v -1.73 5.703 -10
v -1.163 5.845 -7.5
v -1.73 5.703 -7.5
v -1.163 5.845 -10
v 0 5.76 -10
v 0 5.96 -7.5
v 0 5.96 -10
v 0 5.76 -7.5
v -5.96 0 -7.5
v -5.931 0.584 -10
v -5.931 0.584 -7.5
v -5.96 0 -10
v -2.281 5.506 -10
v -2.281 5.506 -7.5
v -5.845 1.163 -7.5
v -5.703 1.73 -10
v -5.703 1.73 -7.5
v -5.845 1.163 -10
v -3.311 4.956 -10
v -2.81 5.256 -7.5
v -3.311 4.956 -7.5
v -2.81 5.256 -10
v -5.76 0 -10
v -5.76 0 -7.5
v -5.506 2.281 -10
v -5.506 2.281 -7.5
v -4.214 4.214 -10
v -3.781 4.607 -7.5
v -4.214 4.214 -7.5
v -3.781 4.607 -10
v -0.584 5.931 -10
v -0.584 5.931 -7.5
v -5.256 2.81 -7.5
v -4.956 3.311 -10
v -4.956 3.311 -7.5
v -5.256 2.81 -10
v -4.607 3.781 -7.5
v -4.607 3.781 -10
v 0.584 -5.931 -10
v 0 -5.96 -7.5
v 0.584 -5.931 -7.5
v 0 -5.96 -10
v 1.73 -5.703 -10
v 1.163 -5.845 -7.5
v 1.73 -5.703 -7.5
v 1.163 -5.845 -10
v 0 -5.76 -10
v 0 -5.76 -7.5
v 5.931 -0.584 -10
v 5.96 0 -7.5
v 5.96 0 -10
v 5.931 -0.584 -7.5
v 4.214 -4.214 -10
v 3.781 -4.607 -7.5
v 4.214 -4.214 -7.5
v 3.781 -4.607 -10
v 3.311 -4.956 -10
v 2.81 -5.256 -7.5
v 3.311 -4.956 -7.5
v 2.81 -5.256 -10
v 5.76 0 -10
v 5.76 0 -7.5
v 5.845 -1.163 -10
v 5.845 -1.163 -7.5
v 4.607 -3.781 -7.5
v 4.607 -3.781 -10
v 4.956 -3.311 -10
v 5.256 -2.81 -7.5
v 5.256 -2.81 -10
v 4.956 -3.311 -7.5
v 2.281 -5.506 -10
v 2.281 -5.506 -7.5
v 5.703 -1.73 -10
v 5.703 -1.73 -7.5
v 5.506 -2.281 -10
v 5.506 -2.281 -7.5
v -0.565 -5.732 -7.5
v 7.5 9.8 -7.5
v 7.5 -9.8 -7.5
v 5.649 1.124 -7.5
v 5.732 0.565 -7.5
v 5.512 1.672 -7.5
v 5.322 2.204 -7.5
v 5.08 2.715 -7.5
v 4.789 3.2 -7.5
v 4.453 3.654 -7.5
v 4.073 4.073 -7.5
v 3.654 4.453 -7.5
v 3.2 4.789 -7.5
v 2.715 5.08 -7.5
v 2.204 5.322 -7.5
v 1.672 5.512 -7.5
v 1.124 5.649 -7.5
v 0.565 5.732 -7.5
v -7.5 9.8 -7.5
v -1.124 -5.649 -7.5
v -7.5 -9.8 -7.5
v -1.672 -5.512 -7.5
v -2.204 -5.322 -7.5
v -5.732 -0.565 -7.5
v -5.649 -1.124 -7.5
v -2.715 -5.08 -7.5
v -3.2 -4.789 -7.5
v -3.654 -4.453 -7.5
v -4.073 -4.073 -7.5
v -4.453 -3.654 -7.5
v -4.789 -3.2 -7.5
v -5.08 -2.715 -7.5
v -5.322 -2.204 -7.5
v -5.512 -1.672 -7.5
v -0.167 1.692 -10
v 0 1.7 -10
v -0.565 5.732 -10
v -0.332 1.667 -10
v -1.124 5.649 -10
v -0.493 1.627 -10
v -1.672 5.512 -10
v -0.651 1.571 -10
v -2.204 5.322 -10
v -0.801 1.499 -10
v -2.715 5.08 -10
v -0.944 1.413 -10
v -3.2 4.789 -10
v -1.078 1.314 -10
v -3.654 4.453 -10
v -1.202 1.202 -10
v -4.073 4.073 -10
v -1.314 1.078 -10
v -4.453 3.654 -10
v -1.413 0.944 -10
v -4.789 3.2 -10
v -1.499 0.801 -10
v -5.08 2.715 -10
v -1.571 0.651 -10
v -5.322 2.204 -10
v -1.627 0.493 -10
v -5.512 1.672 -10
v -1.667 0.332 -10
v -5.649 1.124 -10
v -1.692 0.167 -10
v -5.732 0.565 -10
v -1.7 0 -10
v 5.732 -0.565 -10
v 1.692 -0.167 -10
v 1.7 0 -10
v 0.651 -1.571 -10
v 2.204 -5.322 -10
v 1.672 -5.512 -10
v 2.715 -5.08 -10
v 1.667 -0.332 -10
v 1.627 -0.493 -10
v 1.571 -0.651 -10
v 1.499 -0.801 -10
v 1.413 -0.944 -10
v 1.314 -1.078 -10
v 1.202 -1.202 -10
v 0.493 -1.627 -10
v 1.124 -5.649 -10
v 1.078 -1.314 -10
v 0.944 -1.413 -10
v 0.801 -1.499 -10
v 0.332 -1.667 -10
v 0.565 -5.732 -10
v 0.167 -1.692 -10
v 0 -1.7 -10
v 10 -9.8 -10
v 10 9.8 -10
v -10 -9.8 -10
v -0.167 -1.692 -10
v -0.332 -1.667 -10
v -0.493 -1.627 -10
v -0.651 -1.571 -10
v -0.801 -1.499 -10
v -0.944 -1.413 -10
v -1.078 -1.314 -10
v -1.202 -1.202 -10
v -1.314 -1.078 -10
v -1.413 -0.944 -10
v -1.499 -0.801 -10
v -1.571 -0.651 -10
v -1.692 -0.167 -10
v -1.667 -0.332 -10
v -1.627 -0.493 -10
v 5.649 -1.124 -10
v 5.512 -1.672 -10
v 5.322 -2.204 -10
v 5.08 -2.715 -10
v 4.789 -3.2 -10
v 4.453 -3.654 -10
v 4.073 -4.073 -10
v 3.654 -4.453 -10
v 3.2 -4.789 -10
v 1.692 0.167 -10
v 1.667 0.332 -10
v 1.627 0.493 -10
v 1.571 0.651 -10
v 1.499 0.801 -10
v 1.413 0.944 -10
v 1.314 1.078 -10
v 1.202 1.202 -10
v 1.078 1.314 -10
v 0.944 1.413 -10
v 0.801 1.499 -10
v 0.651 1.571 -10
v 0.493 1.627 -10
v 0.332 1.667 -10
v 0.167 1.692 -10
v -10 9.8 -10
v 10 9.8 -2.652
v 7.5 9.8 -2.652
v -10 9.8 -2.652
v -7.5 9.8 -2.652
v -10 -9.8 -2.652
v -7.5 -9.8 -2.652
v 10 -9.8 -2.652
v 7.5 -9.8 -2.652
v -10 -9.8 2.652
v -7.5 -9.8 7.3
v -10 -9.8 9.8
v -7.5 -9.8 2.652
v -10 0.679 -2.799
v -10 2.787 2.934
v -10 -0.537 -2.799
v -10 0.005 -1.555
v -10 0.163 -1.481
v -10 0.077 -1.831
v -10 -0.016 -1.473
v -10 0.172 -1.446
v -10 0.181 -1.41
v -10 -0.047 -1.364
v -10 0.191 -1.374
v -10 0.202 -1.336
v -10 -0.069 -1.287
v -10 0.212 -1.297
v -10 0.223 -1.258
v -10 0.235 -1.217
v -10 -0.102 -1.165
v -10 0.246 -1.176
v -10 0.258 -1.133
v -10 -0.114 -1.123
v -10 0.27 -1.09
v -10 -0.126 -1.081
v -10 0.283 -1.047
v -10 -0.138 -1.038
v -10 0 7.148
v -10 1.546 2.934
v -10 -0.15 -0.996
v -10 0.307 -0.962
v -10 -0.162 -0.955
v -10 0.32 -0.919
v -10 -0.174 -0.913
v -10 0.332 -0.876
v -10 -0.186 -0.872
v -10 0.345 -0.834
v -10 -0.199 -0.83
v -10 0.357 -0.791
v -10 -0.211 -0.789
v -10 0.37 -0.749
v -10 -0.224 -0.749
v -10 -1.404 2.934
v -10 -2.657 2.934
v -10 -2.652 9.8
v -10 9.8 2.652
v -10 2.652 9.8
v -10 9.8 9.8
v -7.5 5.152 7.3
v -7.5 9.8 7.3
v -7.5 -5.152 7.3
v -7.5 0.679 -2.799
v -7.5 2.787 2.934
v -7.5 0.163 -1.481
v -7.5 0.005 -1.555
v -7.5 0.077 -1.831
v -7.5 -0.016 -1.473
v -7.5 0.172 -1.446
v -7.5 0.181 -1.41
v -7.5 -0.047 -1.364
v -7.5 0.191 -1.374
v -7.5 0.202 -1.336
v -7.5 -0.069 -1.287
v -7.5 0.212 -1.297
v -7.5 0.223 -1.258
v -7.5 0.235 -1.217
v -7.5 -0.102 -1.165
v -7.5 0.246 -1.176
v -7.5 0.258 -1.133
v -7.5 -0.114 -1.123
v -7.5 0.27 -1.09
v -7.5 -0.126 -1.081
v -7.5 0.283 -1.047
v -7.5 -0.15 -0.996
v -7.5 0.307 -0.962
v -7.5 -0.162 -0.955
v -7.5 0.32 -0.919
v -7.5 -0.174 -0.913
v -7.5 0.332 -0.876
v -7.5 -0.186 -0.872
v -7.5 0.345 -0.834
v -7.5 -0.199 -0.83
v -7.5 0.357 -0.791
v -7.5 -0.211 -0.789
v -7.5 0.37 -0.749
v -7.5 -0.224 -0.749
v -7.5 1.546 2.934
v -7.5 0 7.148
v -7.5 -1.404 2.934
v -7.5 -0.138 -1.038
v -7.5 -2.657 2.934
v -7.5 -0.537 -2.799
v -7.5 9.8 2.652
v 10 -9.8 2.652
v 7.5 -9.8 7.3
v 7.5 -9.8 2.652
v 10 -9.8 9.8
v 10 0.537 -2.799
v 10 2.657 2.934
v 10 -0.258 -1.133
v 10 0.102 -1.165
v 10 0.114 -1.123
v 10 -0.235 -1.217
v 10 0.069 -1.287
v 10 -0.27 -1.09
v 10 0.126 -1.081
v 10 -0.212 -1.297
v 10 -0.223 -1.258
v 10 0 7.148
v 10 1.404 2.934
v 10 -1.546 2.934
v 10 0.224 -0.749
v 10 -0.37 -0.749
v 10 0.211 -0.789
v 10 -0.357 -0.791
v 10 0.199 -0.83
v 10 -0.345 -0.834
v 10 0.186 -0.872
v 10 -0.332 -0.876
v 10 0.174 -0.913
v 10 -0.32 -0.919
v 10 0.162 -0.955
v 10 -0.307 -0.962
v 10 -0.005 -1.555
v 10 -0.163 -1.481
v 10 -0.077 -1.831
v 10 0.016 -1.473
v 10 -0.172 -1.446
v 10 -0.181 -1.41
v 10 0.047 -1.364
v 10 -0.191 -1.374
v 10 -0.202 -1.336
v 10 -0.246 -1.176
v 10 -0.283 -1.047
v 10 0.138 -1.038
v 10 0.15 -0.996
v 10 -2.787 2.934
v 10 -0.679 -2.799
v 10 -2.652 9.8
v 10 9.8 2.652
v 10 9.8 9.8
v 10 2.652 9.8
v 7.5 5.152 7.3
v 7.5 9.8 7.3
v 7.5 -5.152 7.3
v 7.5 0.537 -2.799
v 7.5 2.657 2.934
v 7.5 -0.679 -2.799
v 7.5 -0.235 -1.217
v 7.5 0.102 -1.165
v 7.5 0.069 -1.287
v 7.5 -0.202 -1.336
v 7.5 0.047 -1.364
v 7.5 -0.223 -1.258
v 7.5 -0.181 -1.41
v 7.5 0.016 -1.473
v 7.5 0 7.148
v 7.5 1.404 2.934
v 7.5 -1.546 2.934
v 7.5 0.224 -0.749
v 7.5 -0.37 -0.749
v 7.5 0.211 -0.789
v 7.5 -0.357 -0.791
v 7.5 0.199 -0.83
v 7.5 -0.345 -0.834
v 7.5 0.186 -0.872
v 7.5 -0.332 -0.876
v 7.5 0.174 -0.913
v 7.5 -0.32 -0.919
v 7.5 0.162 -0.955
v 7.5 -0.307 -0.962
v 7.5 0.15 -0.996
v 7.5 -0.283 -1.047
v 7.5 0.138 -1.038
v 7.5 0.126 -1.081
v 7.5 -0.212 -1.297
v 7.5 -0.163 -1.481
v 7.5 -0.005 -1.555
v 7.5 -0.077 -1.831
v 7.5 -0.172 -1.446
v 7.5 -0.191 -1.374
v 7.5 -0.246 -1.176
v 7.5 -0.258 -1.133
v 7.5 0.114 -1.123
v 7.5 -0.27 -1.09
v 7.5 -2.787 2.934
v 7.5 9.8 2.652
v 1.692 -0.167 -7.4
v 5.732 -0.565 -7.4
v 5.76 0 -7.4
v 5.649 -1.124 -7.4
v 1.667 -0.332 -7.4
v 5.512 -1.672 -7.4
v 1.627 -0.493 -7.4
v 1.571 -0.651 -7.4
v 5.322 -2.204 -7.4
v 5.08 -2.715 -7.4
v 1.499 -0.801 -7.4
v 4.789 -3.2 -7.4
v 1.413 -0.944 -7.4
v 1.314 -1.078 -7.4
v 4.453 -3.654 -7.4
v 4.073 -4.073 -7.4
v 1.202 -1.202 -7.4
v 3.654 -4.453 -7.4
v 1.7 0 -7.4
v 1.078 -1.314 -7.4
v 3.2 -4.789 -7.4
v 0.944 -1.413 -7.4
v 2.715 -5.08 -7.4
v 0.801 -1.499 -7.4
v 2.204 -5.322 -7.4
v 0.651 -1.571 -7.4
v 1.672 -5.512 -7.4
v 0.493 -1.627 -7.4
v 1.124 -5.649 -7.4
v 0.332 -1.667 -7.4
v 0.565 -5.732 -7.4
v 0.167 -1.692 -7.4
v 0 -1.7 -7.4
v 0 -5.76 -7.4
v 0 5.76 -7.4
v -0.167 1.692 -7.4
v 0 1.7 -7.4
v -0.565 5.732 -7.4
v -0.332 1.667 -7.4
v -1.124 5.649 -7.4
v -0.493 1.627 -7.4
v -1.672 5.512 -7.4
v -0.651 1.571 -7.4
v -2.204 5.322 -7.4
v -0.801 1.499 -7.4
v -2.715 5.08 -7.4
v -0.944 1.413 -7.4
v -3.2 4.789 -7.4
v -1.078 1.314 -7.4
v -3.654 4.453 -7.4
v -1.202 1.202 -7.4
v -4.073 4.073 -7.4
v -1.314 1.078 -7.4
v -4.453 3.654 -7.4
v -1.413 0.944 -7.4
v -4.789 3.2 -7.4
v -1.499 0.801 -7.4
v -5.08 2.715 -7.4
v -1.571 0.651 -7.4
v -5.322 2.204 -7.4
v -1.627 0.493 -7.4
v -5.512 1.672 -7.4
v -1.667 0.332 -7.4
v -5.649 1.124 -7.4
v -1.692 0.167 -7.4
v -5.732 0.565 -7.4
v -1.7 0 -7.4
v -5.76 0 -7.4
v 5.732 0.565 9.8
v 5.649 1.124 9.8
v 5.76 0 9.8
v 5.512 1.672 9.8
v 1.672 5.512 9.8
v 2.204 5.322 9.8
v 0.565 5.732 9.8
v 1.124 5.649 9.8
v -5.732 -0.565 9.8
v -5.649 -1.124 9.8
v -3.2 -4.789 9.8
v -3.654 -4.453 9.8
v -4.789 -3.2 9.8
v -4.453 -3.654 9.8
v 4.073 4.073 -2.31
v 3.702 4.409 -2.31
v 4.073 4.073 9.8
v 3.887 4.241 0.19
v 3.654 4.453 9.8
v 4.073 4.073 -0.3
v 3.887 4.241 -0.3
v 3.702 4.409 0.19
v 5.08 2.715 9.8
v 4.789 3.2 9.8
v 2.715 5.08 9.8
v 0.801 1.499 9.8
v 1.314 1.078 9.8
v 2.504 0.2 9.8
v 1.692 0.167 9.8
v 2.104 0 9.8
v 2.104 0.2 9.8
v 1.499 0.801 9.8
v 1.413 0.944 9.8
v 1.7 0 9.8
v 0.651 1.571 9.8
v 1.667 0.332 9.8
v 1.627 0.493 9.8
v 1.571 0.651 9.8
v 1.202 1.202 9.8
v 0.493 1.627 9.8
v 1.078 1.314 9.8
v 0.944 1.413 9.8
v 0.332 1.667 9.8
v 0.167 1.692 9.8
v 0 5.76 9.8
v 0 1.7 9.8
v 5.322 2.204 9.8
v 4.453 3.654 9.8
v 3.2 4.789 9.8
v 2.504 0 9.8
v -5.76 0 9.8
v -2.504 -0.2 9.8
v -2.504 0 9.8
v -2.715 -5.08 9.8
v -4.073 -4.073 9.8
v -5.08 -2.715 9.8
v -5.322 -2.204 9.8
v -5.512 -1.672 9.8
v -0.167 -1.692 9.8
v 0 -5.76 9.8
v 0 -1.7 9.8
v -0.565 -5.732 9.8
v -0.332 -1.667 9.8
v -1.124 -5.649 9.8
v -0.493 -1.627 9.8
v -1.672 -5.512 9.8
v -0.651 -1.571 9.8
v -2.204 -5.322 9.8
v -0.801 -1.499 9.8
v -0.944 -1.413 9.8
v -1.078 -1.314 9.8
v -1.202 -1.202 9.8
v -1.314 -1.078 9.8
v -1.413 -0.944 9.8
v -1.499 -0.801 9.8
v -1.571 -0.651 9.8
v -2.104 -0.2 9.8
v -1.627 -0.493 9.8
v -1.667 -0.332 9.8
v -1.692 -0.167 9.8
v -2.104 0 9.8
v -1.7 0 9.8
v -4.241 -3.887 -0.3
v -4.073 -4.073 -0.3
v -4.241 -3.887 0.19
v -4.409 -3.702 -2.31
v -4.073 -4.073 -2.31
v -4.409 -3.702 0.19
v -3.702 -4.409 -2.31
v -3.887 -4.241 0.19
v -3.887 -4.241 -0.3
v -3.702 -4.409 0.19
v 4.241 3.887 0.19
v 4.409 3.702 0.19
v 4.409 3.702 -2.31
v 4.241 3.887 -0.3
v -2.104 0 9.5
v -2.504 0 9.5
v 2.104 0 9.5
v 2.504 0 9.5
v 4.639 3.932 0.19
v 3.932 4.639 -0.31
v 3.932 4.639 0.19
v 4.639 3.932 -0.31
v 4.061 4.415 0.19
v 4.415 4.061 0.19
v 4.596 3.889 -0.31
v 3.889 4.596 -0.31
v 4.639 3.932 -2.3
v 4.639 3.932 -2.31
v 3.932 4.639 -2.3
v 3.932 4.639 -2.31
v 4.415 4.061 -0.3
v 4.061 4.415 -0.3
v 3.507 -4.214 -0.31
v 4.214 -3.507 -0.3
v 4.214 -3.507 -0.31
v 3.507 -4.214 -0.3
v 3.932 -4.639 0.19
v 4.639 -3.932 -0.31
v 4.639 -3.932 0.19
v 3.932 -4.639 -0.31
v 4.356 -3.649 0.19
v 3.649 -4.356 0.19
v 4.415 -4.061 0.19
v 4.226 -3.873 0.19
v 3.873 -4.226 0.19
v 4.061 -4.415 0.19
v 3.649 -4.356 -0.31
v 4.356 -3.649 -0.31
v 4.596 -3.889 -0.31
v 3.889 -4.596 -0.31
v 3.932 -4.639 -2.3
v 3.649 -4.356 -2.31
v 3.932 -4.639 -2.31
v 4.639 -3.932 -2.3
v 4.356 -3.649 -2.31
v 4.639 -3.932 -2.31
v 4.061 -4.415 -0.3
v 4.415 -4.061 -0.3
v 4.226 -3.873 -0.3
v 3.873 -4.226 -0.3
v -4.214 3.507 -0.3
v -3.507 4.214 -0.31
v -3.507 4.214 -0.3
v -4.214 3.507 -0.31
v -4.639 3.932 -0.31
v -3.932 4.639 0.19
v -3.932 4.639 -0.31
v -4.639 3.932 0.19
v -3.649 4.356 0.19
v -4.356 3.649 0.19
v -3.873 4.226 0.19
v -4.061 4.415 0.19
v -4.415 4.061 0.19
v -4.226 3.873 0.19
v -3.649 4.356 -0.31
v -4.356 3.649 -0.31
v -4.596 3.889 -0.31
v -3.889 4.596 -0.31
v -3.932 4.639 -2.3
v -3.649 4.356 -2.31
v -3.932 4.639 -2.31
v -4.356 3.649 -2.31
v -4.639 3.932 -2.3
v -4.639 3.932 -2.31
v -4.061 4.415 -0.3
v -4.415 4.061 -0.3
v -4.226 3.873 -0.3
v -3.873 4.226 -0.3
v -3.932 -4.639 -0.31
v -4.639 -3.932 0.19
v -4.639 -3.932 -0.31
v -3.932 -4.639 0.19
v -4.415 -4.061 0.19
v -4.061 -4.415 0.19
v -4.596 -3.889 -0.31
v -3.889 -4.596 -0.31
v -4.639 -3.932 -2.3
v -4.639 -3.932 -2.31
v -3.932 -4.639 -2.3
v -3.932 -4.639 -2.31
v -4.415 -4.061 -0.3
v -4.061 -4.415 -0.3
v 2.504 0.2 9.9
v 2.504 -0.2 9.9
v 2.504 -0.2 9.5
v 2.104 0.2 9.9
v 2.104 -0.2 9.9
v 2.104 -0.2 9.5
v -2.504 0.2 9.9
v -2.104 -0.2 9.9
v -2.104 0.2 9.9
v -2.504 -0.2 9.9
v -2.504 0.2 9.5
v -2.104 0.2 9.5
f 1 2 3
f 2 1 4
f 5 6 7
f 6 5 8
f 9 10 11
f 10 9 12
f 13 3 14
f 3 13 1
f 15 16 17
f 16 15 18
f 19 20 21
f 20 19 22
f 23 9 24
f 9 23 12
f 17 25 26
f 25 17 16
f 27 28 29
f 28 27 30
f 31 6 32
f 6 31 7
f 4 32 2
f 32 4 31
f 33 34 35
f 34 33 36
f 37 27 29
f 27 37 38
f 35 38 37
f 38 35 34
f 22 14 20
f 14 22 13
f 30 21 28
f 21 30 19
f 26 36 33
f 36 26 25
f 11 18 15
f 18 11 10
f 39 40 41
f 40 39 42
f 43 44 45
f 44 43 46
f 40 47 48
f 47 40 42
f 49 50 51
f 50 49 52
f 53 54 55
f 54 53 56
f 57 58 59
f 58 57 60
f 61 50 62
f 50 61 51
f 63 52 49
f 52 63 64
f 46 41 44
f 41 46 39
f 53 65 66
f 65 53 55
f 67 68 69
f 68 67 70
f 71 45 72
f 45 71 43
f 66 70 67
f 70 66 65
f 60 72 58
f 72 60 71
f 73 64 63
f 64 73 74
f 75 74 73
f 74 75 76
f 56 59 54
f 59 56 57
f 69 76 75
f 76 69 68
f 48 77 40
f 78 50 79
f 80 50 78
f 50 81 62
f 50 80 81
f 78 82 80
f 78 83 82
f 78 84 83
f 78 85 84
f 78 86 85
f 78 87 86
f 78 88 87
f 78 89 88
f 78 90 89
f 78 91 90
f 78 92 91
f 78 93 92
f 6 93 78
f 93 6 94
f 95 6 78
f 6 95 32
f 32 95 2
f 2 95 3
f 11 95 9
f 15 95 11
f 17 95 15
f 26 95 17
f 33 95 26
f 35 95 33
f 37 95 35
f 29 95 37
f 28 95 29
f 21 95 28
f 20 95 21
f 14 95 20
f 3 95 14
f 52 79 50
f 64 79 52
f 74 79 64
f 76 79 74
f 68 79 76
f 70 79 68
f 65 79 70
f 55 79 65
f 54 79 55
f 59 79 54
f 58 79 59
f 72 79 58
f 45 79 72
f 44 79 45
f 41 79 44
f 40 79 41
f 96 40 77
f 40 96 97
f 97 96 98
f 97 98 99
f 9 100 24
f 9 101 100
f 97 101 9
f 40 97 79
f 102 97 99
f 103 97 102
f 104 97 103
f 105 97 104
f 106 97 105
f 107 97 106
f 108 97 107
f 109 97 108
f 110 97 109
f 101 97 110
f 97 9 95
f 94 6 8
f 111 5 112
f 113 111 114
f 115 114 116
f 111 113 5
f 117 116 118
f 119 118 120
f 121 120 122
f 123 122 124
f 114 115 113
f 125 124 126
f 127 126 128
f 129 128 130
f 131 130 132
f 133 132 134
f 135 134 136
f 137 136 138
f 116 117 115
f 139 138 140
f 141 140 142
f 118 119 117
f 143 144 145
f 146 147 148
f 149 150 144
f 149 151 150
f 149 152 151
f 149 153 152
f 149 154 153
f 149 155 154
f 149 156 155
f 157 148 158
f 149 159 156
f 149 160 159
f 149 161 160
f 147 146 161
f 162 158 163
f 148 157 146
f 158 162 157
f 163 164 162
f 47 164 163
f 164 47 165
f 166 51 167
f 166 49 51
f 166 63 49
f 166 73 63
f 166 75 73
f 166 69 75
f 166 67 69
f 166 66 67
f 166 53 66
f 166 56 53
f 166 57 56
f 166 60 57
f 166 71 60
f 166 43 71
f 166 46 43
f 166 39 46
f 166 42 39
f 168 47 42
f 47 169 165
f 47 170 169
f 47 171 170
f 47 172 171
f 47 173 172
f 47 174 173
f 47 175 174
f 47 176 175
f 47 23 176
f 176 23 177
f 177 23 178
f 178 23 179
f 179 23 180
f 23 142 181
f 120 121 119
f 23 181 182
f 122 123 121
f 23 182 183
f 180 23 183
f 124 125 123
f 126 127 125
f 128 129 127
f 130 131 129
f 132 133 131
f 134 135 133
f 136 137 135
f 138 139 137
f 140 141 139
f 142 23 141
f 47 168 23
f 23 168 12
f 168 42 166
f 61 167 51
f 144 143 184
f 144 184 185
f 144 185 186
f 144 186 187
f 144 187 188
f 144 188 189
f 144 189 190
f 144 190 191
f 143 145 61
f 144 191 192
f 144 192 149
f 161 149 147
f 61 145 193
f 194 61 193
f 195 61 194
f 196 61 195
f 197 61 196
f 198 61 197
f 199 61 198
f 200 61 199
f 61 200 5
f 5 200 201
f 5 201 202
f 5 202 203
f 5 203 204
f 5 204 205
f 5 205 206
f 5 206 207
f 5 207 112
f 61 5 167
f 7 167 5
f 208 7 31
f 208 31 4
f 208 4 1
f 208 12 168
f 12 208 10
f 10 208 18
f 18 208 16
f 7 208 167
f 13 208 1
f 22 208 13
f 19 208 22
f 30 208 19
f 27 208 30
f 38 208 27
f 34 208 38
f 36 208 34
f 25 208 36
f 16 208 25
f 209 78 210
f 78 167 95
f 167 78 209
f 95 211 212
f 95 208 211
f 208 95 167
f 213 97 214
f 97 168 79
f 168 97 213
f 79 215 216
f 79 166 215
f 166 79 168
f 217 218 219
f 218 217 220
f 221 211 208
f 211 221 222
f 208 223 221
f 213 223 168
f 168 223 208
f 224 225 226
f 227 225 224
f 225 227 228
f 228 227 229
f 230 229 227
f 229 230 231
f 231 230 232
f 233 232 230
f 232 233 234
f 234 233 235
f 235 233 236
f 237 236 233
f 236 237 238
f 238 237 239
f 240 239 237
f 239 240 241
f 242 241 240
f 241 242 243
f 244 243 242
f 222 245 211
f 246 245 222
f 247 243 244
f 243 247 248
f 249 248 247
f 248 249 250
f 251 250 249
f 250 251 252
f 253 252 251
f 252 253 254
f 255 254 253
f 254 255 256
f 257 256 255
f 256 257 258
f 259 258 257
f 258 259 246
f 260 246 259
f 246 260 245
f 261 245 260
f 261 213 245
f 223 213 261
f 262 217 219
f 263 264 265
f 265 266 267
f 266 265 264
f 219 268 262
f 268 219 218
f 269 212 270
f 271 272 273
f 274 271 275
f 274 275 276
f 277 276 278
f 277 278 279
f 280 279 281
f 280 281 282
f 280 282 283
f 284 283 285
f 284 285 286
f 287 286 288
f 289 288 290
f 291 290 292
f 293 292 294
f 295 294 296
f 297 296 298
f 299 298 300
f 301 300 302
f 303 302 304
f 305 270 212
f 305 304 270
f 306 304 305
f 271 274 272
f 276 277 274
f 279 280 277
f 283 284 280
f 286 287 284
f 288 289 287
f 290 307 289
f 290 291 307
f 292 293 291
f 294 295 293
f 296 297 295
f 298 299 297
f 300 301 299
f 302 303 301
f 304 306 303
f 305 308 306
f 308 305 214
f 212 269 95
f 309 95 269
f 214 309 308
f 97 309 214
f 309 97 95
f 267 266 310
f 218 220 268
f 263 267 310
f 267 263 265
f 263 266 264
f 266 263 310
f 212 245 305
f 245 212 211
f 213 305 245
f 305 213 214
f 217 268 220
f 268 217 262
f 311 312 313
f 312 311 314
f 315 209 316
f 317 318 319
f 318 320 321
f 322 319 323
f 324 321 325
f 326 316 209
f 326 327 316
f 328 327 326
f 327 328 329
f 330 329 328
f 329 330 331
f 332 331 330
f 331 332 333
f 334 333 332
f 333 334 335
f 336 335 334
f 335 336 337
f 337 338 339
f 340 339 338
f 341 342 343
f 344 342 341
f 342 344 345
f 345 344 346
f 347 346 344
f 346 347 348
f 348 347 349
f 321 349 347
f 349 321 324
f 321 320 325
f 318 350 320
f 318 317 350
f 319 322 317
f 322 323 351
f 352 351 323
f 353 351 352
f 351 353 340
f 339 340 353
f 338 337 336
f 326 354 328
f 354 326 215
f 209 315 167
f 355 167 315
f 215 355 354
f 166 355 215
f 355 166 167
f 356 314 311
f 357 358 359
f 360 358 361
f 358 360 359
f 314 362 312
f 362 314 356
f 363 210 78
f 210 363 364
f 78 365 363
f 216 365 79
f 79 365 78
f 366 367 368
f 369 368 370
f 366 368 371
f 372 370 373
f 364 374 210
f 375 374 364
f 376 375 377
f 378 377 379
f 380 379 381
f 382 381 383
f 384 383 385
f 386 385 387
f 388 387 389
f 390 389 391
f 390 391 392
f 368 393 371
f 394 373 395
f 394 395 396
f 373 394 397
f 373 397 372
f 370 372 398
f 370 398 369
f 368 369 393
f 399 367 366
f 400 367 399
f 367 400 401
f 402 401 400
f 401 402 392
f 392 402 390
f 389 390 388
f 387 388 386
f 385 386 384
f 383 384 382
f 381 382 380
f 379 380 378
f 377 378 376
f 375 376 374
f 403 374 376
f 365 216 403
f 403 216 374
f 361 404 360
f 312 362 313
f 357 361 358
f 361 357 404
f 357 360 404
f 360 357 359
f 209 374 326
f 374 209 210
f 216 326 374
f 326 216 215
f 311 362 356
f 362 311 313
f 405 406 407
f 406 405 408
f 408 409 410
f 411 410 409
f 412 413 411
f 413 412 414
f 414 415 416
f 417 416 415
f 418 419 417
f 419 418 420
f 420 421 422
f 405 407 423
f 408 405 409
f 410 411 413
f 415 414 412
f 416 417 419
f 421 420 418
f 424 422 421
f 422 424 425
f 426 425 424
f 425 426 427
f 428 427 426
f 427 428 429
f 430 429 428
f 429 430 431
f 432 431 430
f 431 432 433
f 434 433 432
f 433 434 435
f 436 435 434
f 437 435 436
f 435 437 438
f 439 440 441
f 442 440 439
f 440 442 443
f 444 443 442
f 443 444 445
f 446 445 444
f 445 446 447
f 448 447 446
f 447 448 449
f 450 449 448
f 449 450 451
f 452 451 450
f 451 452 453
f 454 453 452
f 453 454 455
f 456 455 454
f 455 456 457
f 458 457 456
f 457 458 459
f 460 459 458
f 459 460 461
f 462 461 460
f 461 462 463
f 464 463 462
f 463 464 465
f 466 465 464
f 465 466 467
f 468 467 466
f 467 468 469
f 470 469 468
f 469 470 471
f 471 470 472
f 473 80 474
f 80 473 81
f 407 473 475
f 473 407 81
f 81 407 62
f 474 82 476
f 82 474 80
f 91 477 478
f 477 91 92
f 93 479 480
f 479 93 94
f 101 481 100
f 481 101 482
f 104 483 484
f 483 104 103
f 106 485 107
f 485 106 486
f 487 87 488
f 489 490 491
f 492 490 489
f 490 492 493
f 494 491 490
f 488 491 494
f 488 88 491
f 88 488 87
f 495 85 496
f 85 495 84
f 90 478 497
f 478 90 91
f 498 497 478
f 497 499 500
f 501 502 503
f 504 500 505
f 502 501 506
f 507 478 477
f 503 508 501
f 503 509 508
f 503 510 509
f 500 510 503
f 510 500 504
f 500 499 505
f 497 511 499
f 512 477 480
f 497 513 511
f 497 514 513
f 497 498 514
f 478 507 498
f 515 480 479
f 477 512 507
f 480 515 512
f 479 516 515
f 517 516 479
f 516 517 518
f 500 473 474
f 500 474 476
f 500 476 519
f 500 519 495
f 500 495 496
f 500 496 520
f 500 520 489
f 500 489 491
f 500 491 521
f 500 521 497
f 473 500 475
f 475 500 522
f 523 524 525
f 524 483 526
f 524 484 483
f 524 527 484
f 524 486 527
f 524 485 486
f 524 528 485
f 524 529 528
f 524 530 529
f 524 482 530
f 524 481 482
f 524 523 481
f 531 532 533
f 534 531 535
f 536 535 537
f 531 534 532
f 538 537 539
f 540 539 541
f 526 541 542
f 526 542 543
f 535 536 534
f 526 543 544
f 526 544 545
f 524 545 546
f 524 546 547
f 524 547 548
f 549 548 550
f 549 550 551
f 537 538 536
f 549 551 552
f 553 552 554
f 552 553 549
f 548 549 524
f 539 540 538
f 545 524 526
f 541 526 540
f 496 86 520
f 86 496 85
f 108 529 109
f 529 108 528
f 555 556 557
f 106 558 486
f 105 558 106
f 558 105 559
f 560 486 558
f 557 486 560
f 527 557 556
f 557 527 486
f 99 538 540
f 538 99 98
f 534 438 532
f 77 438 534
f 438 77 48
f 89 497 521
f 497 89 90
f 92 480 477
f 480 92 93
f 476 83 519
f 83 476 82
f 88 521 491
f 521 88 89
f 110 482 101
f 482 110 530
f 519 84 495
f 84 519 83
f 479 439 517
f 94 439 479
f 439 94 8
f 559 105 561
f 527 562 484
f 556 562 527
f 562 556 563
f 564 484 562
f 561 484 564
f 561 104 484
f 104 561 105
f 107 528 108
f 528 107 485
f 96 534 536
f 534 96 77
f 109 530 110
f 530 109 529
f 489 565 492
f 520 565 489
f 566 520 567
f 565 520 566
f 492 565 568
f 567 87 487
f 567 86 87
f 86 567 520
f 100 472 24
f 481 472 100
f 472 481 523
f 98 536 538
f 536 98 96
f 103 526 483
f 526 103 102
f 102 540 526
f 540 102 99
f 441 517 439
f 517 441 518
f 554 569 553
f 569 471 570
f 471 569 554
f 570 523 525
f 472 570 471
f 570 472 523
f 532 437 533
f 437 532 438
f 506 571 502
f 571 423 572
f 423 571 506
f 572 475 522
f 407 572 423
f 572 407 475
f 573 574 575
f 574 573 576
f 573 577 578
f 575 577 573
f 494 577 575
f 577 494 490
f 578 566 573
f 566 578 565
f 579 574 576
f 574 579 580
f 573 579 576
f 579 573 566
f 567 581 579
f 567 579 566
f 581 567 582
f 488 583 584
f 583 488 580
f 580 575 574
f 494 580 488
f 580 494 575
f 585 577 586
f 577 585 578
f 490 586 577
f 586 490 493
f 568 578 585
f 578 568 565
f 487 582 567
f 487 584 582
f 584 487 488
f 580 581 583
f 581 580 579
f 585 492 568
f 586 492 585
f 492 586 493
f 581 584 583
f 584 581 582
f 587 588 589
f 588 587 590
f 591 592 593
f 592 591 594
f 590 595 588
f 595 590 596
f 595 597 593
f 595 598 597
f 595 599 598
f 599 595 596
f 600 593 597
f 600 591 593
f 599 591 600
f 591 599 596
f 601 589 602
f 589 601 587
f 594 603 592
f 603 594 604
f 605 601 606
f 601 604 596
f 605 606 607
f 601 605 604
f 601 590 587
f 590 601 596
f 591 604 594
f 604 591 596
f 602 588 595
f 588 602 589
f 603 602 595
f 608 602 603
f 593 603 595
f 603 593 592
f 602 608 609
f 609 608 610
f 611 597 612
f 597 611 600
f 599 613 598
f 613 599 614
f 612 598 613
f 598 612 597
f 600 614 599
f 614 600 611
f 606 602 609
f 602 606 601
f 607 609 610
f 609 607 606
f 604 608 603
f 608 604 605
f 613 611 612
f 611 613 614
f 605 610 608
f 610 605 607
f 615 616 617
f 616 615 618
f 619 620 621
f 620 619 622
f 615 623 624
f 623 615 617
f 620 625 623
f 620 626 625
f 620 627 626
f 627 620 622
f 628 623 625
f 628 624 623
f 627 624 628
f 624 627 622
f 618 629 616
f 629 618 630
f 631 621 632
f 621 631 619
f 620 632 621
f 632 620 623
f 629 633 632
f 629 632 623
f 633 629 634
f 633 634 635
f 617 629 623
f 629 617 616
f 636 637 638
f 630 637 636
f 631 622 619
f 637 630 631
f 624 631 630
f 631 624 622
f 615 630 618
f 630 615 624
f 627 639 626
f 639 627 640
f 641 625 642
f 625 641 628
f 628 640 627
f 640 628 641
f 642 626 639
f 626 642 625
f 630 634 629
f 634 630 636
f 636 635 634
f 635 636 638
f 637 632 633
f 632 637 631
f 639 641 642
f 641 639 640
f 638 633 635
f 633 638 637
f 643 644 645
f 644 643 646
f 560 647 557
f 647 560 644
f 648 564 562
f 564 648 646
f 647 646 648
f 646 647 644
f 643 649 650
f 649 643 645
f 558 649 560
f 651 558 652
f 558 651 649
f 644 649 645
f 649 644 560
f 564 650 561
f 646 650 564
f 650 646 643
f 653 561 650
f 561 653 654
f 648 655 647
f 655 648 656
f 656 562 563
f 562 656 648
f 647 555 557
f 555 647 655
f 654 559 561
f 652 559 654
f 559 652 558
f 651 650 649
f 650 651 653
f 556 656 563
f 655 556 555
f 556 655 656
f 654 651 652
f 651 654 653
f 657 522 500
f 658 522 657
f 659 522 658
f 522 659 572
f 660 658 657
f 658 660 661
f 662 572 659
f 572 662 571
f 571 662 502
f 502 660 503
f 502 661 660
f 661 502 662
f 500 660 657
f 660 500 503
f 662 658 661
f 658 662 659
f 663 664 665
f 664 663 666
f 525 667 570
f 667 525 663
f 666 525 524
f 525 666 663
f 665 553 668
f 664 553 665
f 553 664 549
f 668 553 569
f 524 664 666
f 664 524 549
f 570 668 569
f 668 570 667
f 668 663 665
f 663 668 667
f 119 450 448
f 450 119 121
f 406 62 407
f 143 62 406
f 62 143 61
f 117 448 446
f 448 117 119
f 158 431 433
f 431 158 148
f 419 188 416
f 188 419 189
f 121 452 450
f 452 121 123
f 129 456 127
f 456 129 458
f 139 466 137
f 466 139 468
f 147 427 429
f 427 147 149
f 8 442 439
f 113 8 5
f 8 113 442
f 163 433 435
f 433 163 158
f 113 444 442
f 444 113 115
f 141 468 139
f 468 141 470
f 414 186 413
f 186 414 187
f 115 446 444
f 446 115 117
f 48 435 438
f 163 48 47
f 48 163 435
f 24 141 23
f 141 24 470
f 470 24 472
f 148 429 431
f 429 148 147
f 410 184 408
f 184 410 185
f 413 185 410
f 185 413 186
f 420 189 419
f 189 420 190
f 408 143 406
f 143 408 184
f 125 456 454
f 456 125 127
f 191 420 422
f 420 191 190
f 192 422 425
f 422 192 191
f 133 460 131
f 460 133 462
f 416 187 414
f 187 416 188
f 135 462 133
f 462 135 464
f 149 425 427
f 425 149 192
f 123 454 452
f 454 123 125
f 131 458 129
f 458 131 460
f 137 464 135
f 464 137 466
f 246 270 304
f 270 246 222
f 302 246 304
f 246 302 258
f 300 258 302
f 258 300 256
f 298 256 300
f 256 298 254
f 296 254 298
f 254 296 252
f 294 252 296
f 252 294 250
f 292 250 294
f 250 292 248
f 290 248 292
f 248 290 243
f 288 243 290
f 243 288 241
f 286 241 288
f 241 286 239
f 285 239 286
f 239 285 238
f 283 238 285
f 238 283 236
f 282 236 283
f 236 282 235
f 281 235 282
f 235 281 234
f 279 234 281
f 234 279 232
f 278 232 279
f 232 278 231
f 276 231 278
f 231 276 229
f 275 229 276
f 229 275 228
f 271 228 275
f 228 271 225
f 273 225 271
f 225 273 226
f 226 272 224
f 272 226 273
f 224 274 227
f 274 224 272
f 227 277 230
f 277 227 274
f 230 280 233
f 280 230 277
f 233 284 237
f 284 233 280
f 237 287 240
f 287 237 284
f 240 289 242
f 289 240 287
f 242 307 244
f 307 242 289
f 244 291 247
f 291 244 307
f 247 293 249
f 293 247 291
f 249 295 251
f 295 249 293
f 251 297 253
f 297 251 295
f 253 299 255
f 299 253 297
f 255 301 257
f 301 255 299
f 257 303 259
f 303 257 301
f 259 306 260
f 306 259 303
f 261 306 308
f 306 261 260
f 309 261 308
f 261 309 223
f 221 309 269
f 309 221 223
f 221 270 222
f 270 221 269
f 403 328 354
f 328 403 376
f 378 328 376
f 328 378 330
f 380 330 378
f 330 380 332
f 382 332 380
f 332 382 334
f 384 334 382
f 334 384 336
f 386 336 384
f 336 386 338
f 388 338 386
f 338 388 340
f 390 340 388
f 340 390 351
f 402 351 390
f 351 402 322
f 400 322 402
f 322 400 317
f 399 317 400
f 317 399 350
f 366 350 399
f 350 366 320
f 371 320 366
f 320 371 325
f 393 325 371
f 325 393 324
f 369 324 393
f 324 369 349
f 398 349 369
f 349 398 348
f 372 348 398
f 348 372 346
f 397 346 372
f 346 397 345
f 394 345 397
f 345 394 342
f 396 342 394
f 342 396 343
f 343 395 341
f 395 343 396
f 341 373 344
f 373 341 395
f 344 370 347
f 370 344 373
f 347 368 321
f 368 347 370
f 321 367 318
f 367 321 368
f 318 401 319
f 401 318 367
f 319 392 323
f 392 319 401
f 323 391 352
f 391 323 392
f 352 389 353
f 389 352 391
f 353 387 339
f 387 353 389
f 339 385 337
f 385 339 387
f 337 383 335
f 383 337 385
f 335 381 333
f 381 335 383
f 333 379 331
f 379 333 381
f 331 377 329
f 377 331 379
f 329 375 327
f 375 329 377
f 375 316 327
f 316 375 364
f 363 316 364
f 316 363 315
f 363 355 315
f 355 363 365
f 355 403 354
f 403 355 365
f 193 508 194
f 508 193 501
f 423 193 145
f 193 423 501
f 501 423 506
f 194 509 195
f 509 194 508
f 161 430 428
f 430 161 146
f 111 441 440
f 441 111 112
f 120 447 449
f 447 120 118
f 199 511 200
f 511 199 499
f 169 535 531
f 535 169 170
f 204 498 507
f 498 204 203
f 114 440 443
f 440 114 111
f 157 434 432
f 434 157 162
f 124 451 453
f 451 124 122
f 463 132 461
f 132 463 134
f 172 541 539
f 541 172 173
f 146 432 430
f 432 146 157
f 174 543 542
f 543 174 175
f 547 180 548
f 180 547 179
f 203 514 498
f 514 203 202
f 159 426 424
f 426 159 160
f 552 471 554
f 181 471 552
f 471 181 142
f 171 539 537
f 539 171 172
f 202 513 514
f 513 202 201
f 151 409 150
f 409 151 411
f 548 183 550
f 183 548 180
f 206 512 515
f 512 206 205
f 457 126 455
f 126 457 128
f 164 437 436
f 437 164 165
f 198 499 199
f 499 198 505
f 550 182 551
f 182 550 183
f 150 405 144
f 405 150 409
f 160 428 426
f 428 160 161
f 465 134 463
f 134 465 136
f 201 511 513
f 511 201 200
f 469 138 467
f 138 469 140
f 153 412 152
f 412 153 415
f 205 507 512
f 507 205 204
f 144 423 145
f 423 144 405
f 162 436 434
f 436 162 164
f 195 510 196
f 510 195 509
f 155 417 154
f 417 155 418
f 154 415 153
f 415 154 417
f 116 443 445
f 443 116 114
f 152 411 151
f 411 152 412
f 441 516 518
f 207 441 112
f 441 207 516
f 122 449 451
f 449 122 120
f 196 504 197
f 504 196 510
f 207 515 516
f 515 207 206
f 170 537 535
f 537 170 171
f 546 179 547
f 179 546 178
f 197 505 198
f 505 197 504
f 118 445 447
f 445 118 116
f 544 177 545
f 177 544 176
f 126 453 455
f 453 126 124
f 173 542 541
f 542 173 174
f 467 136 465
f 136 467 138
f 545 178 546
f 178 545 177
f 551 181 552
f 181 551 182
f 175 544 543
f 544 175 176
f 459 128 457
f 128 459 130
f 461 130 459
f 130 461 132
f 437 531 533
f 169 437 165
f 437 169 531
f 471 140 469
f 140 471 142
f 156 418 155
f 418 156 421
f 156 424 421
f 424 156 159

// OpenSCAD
// half_cube.scad - Parametric Half-Cube with Snap-Fit Mechanism
// Research-faithful implementation: Dual-U topology, snap locks, mitered walls
// Units: mm

$fn = 64;

// --- Parameters ---
size = 20.0;          // Outer cube dimension
thick = 2.5;          // Wall thickness
rod_D = 3.0;          // Rod diameter
clearance = 0.2;      // Clearance for rod bore
fit_clear = 0.2;      // Miter face clearance (per research)

// --- Visibility Toggles ---
show_base = true;
show_walls = true;
show_mech = true;
show_letter = true;

// --- Advanced Visibility (sub-component toggles) ---
show_wall_left = true;
show_wall_right = true;
show_mech_base_ring = true;
show_mech_pillars = true;
show_mech_snap_beams = true;

// --- Flip Mode (for top unit) ---
is_flipped = false;        // true = top unit (rotated mechanism, inverted letter)

// --- Letter Parameters ---
letter = is_flipped ? "F" : "V";
letter_emboss = false;     // true = raised, false = carved
letter_depth = 0.5;
letter_size = 6;

// --- Snap-Fit Parameters (scaled from research: 60mm -> size) ---
scale_factor = size / 60;
snap_beam_len   = max(6.0 * scale_factor, 1.5);  // Cantilever beam length
snap_beam_width = max(3.0 * scale_factor, 0.8);   // Beam width
snap_beam_thick = max(1.2 * scale_factor, 0.4);   // Beam thickness
snap_undercut   = max(0.6 * scale_factor, 0.15);   // Undercut depth on snap head
snap_head_len   = max(1.5 * scale_factor, 0.4);    // Length of snap head
snap_relief_w   = max(1.5 * scale_factor, 0.3);    // Relief slot width
snap_relief_d   = max(0.8 * scale_factor, 0.2);    // Relief slot depth into head
snap_sink       = max(size * 0.005, 0.05);            // Head sunk into shaft for boolean union

// Derived
cyl_R_base = rod_D/2 + clearance;
cyl_R = cyl_R_base + (size/2 - thick - cyl_R_base) * 0.7;  // Adaptive to available space
cyl_H = size - thick - fit_clear;

// Weld cube size for mesh integrity at internal junctions
weld = max(size * 0.02, 0.15);

// --- Main Assembly ---
module assembly(
    flipped=is_flipped,
    v_base=show_base, v_walls=show_walls, v_mech=show_mech, v_letter=show_letter,
    v_wall_left=show_wall_left, v_wall_right=show_wall_right,
    v_mech_base_ring=show_mech_base_ring,
    v_mech_pillars=show_mech_pillars,
    v_mech_snap_beams=show_mech_snap_beams
) {
    difference() {
        union() {
            // 1. Base Plate
            if (v_base)
                translate([0, 0, -size/2 + thick/2])
                    base_plate(flipped=flipped);

            // 2. Side Walls with full mitered edges (top + front/back)
            if (v_walls && v_wall_left)
                translate([-size/2 + thick/2, 0, 0])
                    mitered_wall();
            if (v_walls && v_wall_right)
                translate([size/2 - thick/2, 0, 0])
                    mirror([1,0,0]) mitered_wall();

            // 3. Central mechanism with snap-fit
            if (v_mech)
                translate([0, 0, -size/2])
                    mechanism_pillars(flipped=flipped,
                        v_base_ring=v_mech_base_ring,
                        v_pillars=v_mech_pillars,
                        v_snap_beams=v_mech_snap_beams);

            // 4. Letters on BOTH walls (embossed mode)
            if (v_letter && letter_emboss) {
                letter_geometry(flipped=flipped, side="left");
                letter_geometry(flipped=flipped, side="right");
            }
        }

        // Global subtractions
        // Rod bore through center
        cylinder(r=rod_D/2 + clearance, h=size*2, center=true);

        // Letters carved on BOTH walls
        if (v_letter && !letter_emboss) {
            letter_geometry(flipped=flipped, side="left");
            letter_geometry(flipped=flipped, side="right");
        }
    }
}

// --- Base Plate ---
// Full width/depth with quarter-circle perforations for opposing mechanism pass-through
module base_plate(flipped=false) {
    perf_R = cyl_R + fit_clear;
    // Bottom half (flipped=false): opposing pillars are at Q2/Q4 (angles 90, 270)
    // Top half (flipped=true): opposing pillars are at Q1/Q3 (angles 0, 180)
    perf_base = flipped ? 0 : 90;

    difference() {
        cube([size - 2*fit_clear, size - 2*fit_clear, thick], center=true);

        // Quarter-circle perforations for opposing mechanism
        for (angle = [perf_base, perf_base + 180])
            rotate([0, 0, angle])
                linear_extrude(thick + 1, center=true)
                    intersection() {
                        circle(r = perf_R, $fn = 64);
                        polygon([[0,0], [size,0], [0,size]]);
                    };
    }
}

// --- Mitered Wall ---
// Full-height wall from -size/2 to +size/2-fit_clear with 45° miters on top and front/back
module mitered_wall() {
    wall_length = size - 2*fit_clear;  // Y dimension

    difference() {
        // Main wall body — full height
        rotate([90, 0, 0])
        linear_extrude(wall_length, center=true)
            polygon([
                [-thick/2, -size/2],                   // Bottom-outer
                [-thick/2, size/2 - fit_clear],        // Top-outer (full height)
                [thick/2, size/2 - thick - fit_clear], // Top-inner (45° miter)
                [thick/2, -size/2]                     // Bottom-inner
            ]);

        // Front miter cut: full-height 45° chamfer at +Y corner
        translate([0, size/2 - fit_clear, 0])
            rotate([45, 0, 0])
                cube([thick + 1, thick * 1.5, size * 2], center=true);

        // Back miter cut: full-height 45° chamfer at -Y corner
        translate([0, -(size/2 - fit_clear), 0])
            rotate([-45, 0, 0])
                cube([thick + 1, thick * 1.5, size * 2], center=true);
    }
}

// --- Letter Geometry ---
// Places letter on specified wall exterior
// Both left and right walls get letters
module letter_geometry(flipped=is_flipped, side="left") {
    local_letter = flipped ? "F" : "V";
    flip_angle = flipped ? 180 : 0;
    letter_z = 0;  // Center of cube (full-height walls)

    if (side == "left") {
        wall_x = -size/2;
        translate([wall_x, 0, letter_z])
            rotate([90, flip_angle, 90])
                scale([flipped ? -1 : 1, 1, 1])
                    linear_extrude(letter_depth + (letter_emboss ? 0 : thick))
                        text(local_letter, size=letter_size, halign="center", valign="center",
                             font="Liberation Sans:style=Bold");
    } else {
        // Right wall: mirror placement
        wall_x = size/2;
        translate([wall_x, 0, letter_z])
            rotate([90, flip_angle, -90])
                scale([flipped ? -1 : 1, 1, 1])
                    linear_extrude(letter_depth + (letter_emboss ? 0 : thick))
                        text(local_letter, size=letter_size, halign="center", valign="center",
                             font="Liberation Sans:style=Bold");
    }
}

// --- Mechanism Pillars with Snap-Fit ---
// Two opposing quadrant pillars with base ring, snap beams, and weld cubes
module mechanism_pillars(flipped=is_flipped,
    v_base_ring=true, v_pillars=true, v_snap_beams=true
) {
    base_ring_h = thick + max(size * 0.005, 0.05);
    pillar_height = cyl_H;

    mech_rotation = flipped ? 90 : 0;

    rotate([0, 0, mech_rotation])
    union() {
        // 1. Solid base ring
        if (v_base_ring)
            cylinder(r=cyl_R, h=base_ring_h);

        // 2. Weld cubes at base ring / pillar junction for mesh integrity
        if (v_pillars)
            for (angle = [0, 90, 180, 270])
                rotate([0, 0, angle])
                    translate([cyl_R * 0.5, 0, base_ring_h - weld/2])
                        cube(weld, center=true);

        // 3. Pillars with wedge cuts
        if (v_pillars)
            translate([0, 0, base_ring_h - 0.1])
                difference() {
                    cylinder(r=cyl_R, h=pillar_height);

                    // Cut away Q2 and Q4 (90° and 270°)
                    rotate([0, 0, 90])
                        wedge_cutter(pillar_height + 1);
                    rotate([0, 0, 270])
                        wedge_cutter(pillar_height + 1);
                }

        // 4. Snap-fit cantilever beams on pillar faces
        if (v_snap_beams) {
            // Pillar Q1: beam at 90° face (facing +Y)
            translate([0, 0, base_ring_h - 0.1])
                snap_beam_at(angle=45, pillar_height=pillar_height);

            // Pillar Q1: beam at 0° face (facing +X)
            translate([0, 0, base_ring_h - 0.1])
                snap_beam_at(angle=315, pillar_height=pillar_height);

            // Pillar Q3: beam at 180° face (facing -X)
            translate([0, 0, base_ring_h - 0.1])
                snap_beam_at(angle=135, pillar_height=pillar_height);

            // Pillar Q3: beam at 270° face (facing -Y)
            translate([0, 0, base_ring_h - 0.1])
                snap_beam_at(angle=225, pillar_height=pillar_height);
        }

        // 5. Weld cubes at pillar tops for mesh integrity
        if (v_snap_beams)
            for (angle = [0, 180])
                rotate([0, 0, angle])
                    translate([cyl_R * 0.4, 0, base_ring_h + pillar_height - weld/2])
                        cube(weld, center=true);
    }
}

// --- Snap Beam ---
// Cantilever beam with undercut head and relief slot
// Placed at a given angle on the cylinder surface, growing upward from mid-pillar
module snap_beam_at(angle, pillar_height) {
    beam_z_start = pillar_height * 0.3;  // Start beam at 30% up the pillar

    rotate([0, 0, angle])
    translate([cyl_R - snap_sink, 0, beam_z_start]) {
        // Cantilever beam body
        // Extends radially outward, with length along Z
        rotate([0, 0, 0])
        union() {
            // Beam shaft - tapered slightly (thicker at root)
            hull() {
                // Root (attached to pillar)
                translate([0, -snap_beam_width/2, 0])
                    cube([snap_beam_thick, snap_beam_width, 0.01]);
                // Tip (slightly thinner)
                translate([0, -snap_beam_width/2, snap_beam_len])
                    cube([snap_beam_thick * 0.85, snap_beam_width, 0.01]);
            }

            // Snap head with undercut
            translate([0, -snap_beam_width/2, snap_beam_len])
                snap_head();
        }
    }
}

// --- Snap Head ---
// Overhanging head with undercut for positive engagement
// Includes relief slot for beam flexibility
module snap_head() {
    difference() {
        // Ramped head: hull from full undercut at base to flush at tip
        // Creates ~30° lead-in chamfer for easier insertion
        hull() {
            // Base: full undercut width
            translate([-snap_undercut, 0, 0])
                cube([snap_beam_thick + snap_undercut, snap_beam_width, 0.01]);
            // Tip: no undercut (flush with beam)
            translate([0, 0, snap_head_len - 0.01])
                cube([snap_beam_thick, snap_beam_width, 0.01]);
        }

        // Relief slot through center of head for flexibility
        translate([snap_beam_thick/2 - snap_relief_d/2, (snap_beam_width - snap_relief_w)/2, -0.1])
            cube([snap_relief_d, snap_relief_w, snap_head_len + 0.2]);
    }
}

// --- Wedge Cutter ---
// 90° sector cutter for quadrant removal
module wedge_cutter(h=size) {
    linear_extrude(h)
        polygon([[0, 0], [size, 0], [0, size]]);
}

// --- Render ---
if (is_undef(is_library)) {
    assembly();
}
